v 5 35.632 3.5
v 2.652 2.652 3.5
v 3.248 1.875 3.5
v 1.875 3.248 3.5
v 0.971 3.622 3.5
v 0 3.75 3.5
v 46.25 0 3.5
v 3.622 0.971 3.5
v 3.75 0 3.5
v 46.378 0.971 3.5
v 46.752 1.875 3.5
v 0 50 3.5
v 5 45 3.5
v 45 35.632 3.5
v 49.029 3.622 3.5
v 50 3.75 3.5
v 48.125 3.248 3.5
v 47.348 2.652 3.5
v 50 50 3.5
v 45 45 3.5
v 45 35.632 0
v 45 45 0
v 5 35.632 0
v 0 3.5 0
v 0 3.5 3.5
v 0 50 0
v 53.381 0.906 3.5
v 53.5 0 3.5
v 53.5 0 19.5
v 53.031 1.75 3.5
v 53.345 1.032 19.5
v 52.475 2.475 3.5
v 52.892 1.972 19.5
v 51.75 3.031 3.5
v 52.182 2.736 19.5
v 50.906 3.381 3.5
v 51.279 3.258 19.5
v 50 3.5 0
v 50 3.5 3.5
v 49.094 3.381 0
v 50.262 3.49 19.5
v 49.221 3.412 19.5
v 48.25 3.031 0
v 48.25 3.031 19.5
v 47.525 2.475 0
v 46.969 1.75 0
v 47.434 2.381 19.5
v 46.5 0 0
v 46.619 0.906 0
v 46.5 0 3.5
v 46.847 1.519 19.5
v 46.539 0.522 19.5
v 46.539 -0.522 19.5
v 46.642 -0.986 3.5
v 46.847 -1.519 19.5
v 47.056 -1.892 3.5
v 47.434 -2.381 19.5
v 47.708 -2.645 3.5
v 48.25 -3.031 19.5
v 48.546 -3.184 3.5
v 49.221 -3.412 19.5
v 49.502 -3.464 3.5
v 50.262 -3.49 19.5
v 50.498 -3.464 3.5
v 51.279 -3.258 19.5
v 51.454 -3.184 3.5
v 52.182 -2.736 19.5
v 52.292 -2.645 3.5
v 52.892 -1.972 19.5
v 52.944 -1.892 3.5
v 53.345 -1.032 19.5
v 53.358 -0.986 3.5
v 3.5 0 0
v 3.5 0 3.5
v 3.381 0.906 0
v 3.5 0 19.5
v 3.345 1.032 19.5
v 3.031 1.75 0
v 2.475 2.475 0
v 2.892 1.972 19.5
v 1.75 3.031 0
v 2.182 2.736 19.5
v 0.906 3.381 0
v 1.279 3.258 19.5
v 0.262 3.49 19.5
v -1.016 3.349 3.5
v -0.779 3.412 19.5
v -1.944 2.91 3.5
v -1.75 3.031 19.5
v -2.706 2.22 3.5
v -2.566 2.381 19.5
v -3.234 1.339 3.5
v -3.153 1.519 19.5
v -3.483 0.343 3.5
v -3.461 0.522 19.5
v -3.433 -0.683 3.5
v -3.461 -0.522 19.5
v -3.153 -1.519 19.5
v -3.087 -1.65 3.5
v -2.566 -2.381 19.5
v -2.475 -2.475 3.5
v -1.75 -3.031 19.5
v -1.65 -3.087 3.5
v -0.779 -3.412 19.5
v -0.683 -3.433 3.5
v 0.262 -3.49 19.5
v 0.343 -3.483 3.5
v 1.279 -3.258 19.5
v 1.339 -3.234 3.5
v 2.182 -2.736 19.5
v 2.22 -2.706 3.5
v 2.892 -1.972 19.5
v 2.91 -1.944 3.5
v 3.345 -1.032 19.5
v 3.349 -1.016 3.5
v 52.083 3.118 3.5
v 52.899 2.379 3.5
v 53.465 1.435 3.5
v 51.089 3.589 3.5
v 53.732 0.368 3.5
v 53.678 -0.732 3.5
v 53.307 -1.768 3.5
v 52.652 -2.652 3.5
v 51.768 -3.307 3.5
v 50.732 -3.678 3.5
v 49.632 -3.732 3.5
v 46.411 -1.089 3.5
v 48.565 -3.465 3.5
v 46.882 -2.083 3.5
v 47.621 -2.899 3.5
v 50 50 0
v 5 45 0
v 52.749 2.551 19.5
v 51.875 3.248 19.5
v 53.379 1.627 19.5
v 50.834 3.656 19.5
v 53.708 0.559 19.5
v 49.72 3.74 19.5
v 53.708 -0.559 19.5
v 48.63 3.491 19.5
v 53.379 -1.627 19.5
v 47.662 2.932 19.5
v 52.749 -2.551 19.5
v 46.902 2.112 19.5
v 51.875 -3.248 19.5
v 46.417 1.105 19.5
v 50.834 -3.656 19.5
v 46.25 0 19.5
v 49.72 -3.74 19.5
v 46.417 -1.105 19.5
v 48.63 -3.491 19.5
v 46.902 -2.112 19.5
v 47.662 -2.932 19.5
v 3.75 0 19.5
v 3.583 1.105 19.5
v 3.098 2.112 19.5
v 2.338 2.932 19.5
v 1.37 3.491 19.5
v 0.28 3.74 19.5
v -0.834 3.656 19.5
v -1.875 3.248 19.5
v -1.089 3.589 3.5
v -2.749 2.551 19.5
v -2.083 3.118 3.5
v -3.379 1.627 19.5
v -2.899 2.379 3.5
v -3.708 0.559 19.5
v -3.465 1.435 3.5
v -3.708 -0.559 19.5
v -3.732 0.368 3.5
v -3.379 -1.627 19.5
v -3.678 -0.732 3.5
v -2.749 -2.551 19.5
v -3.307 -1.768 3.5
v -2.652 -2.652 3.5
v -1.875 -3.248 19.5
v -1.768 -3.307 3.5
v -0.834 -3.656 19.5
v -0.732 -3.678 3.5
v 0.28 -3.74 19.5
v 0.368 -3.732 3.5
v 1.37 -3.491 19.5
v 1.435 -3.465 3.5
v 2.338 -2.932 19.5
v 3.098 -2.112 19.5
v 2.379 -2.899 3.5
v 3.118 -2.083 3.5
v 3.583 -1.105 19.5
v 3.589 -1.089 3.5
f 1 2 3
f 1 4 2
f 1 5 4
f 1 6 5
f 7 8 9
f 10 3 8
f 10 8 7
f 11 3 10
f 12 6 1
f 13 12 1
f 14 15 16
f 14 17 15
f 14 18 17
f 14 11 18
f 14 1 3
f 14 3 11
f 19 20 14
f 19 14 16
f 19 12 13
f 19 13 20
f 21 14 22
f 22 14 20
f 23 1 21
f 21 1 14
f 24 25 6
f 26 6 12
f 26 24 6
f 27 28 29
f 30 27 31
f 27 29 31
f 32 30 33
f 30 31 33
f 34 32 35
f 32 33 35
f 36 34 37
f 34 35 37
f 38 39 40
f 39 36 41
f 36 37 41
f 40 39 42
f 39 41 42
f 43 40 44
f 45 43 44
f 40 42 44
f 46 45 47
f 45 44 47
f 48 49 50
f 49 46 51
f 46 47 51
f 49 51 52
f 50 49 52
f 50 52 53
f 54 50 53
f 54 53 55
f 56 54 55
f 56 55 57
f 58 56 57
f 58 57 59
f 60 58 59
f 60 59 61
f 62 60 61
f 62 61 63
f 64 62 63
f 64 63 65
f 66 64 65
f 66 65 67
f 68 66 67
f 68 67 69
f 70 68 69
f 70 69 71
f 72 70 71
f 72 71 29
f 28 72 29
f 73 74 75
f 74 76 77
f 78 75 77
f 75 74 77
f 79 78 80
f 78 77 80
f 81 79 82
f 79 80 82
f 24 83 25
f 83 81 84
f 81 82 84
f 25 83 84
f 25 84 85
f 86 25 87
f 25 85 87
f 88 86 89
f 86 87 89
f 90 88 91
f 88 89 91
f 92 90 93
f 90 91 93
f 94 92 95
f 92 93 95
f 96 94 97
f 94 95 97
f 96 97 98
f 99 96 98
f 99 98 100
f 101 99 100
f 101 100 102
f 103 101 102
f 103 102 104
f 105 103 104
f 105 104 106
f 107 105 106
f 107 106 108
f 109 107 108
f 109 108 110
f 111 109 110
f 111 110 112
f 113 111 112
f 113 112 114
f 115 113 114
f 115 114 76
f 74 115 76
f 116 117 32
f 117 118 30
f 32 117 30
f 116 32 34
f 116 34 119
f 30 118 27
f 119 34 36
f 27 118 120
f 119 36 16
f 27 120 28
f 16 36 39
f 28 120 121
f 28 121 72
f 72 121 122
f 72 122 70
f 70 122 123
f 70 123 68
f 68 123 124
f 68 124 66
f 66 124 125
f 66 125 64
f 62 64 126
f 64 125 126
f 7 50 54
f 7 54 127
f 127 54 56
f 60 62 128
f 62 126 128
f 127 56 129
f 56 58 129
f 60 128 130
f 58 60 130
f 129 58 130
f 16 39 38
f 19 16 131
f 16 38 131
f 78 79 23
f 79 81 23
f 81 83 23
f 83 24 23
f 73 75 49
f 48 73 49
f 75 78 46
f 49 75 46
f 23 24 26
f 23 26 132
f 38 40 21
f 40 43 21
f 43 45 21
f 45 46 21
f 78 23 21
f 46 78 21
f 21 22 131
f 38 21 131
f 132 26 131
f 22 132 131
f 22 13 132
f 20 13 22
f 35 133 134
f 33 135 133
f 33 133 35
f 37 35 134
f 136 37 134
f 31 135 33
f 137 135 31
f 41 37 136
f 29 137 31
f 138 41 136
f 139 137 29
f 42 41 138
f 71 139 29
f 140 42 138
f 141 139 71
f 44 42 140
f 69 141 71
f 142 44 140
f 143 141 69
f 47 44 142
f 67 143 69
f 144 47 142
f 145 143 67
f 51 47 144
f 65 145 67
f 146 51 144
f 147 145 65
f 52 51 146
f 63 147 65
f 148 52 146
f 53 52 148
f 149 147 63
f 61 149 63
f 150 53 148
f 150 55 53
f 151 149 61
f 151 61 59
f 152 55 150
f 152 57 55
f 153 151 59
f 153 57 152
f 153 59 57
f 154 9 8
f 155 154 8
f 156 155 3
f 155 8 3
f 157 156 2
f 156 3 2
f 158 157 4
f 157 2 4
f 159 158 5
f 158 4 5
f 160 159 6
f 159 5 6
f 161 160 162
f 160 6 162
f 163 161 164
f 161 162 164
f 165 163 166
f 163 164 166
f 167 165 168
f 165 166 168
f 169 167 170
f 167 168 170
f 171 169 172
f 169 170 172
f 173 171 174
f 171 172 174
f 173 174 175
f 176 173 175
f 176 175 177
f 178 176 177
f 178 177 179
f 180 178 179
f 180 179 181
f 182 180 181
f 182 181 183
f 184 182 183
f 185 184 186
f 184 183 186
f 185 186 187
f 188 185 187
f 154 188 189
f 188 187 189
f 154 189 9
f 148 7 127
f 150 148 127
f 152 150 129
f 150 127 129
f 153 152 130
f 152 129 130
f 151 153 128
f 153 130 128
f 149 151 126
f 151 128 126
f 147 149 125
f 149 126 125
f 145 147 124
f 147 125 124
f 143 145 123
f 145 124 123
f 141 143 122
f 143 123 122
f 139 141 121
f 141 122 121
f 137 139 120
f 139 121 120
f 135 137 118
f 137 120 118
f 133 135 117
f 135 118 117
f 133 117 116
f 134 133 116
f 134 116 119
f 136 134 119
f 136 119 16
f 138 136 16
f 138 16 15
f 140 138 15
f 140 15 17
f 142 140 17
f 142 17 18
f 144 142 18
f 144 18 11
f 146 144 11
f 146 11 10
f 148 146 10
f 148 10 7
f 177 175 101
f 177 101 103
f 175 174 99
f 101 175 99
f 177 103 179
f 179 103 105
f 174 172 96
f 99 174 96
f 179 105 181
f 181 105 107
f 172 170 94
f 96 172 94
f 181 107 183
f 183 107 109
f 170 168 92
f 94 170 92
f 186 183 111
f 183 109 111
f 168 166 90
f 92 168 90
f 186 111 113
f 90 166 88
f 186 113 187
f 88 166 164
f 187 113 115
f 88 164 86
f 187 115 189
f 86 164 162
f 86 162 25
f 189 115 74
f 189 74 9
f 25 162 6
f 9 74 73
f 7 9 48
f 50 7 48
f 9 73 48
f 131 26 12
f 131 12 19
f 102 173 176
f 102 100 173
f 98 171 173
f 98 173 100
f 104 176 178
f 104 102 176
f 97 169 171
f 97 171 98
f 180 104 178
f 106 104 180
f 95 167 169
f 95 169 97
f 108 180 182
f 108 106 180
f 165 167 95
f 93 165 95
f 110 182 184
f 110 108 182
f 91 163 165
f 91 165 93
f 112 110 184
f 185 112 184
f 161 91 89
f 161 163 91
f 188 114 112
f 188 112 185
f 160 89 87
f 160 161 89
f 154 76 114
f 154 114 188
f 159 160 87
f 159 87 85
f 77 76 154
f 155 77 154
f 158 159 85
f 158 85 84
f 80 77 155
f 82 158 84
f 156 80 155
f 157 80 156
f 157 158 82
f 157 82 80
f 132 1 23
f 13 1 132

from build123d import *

# Parameters (mm, degrees)
SKETCH1_W           = 50
SKETCH1_H           = 50
BOSS_EXTRUDE1_DEPTH = 3.5
SKETCH2_R           = 3.75
BOSS_EXTRUDE2_DEPTH = 16
SKETCH3_R           = 3.5
CUT_EXTRUDE2_DEPTH  = 19.5
SKETCH4_W           = 40
SKETCH4_H           = 9.367616821
CUT_EXTRUDE3_DEPTH  = 19.5


with BuildPart() as part:
    # Sketch1 → Boss-Extrude1 (new body)
    with BuildSketch(Plane.XY):
        with Locations((25, 25)):
            Rectangle(SKETCH1_W, SKETCH1_H)
    extrude(amount=BOSS_EXTRUDE1_DEPTH)

    # Sketch2 → Boss-Extrude2 (add)
    with BuildSketch(Plane.XY.offset(3.5)):
        Circle(SKETCH2_R)
        with Locations(Location((50, 0, 0), (0, 0, 180))):
            Circle(SKETCH2_R)
    extrude(amount=BOSS_EXTRUDE2_DEPTH)

    # Sketch3 → Cut-Extrude2 (cut)
    with BuildSketch(Plane.XY.offset(19.5)):
        Circle(SKETCH3_R)
        with Locations((50, 0)):
            Circle(SKETCH3_R)
    extrude(amount=-CUT_EXTRUDE2_DEPTH, mode=Mode.SUBTRACT)

    # Sketch4 → Cut-Extrude3 (cut)
    with BuildSketch(Plane.XY.offset(3.5)):
        with Locations((25, 40.31619159)):
            Rectangle(SKETCH4_W, SKETCH4_H)
    extrude(amount=-CUT_EXTRUDE3_DEPTH, mode=Mode.SUBTRACT)


solid = part.part
